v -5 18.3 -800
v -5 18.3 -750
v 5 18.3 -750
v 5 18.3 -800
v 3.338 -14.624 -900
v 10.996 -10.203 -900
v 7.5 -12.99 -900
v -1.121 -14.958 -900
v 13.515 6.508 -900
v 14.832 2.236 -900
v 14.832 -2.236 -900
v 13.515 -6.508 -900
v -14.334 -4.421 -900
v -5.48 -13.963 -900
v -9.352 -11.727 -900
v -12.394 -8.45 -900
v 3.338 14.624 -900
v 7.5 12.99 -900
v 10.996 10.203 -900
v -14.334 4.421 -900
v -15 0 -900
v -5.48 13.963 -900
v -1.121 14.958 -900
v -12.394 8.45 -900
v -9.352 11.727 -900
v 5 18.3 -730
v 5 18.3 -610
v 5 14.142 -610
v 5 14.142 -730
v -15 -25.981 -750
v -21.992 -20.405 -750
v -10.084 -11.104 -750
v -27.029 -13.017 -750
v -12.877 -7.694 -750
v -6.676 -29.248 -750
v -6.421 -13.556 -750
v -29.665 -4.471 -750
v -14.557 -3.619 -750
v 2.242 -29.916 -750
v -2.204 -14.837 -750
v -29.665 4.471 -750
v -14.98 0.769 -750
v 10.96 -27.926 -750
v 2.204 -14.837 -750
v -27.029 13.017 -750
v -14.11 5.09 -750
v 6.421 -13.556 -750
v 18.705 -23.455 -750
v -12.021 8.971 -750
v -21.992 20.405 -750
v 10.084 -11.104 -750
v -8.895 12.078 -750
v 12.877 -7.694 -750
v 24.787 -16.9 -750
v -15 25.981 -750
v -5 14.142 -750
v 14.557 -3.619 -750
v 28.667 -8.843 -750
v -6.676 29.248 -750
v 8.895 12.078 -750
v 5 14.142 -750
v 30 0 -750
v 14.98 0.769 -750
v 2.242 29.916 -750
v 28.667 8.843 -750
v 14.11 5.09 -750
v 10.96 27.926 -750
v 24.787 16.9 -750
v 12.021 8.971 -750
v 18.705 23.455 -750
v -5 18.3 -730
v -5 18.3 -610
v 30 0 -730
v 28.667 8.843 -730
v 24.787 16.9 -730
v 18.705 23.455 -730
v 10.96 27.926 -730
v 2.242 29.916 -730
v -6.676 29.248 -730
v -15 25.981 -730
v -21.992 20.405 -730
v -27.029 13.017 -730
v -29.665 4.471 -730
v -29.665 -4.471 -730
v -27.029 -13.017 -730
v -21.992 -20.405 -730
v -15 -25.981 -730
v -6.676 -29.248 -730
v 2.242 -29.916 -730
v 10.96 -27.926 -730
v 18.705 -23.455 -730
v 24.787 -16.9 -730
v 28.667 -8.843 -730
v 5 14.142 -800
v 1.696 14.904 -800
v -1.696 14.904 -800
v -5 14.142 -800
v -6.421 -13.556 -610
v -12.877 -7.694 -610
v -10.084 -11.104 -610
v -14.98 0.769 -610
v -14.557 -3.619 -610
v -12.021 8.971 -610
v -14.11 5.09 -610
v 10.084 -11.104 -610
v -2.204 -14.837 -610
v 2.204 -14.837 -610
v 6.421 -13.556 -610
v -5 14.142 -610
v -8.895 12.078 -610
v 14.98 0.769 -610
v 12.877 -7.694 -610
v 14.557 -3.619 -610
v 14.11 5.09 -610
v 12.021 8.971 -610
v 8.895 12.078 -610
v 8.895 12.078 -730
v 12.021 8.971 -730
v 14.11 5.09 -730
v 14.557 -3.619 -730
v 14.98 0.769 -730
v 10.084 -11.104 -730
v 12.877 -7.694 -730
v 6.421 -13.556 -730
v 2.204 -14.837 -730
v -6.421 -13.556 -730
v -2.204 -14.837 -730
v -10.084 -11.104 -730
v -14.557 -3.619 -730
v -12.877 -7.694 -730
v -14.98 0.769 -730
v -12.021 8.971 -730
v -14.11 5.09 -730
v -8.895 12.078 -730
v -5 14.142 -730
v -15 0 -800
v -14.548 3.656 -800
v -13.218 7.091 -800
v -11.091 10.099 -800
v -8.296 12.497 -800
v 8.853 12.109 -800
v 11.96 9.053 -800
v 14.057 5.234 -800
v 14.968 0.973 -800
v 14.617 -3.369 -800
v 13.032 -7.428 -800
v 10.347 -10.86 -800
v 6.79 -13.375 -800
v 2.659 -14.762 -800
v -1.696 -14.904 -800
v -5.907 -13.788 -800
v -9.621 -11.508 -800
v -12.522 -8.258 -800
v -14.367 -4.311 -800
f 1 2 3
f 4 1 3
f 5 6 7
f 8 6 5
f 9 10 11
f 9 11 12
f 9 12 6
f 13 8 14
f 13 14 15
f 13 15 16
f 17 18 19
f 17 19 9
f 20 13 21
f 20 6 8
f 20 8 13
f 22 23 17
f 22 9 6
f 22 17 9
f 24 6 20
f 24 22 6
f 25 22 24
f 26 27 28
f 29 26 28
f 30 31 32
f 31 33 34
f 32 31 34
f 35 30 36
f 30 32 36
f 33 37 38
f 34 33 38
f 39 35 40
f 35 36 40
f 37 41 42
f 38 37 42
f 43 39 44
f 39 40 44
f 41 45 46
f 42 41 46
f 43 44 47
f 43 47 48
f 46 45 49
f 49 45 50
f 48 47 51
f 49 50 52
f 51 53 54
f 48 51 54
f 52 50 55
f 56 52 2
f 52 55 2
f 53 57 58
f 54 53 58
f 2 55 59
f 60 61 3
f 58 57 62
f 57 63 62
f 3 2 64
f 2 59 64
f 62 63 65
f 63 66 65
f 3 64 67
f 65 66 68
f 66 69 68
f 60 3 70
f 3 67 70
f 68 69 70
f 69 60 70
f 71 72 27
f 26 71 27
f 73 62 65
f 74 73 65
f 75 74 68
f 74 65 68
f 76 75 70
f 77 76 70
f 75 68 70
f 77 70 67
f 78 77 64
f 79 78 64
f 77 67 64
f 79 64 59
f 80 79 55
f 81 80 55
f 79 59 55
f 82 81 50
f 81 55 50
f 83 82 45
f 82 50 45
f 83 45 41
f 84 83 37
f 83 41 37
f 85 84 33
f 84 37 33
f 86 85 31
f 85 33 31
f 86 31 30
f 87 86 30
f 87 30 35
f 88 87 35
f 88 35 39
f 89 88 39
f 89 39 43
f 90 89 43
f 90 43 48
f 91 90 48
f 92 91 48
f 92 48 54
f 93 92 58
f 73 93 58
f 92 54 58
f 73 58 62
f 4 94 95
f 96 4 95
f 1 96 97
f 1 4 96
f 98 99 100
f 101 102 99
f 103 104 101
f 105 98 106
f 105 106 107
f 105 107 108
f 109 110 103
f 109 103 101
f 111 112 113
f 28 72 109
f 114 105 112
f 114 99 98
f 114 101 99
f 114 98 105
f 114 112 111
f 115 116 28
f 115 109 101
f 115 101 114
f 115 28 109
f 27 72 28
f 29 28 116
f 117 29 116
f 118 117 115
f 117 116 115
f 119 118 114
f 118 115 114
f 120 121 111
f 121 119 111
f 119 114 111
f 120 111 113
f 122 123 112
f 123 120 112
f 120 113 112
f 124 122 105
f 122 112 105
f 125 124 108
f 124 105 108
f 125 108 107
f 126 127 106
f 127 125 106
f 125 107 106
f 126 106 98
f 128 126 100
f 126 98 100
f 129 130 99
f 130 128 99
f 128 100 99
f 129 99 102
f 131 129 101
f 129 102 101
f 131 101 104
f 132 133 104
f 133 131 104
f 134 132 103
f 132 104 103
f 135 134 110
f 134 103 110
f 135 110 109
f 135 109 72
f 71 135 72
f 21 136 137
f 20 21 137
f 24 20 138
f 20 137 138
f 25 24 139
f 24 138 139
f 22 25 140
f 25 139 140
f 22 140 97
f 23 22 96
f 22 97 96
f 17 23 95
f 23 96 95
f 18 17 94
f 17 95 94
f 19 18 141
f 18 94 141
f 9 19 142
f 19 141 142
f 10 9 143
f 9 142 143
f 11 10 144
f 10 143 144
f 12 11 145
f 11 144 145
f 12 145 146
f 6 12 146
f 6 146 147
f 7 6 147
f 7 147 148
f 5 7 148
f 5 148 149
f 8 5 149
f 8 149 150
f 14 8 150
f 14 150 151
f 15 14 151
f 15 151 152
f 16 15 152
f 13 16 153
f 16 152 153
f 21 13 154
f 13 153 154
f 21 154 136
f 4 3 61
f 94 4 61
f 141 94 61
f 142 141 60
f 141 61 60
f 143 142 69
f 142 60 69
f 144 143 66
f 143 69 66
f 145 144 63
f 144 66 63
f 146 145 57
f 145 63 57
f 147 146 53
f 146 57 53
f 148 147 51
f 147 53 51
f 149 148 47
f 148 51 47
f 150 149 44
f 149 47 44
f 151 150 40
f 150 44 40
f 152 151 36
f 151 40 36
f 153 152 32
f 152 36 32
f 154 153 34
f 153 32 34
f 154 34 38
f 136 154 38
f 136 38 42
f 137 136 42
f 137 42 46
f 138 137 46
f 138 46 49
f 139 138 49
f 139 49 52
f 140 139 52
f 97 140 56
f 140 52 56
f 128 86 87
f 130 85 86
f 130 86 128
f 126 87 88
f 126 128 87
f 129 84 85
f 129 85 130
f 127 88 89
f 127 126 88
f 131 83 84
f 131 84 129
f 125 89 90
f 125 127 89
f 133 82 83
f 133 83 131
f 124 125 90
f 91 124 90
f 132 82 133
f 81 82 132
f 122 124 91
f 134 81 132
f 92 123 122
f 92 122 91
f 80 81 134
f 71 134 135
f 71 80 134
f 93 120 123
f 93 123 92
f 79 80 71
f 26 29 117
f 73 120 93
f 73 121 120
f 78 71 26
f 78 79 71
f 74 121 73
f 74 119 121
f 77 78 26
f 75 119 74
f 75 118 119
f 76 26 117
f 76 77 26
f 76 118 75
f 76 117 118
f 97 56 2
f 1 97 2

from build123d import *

# Parameters (mm, degrees)
BOSS_EXTRUDE1_DEPTH = 800
SKETCH3_R           = 30
BOSS_EXTRUDE3_DEPTH = 20
SKETCH4_R           = 30
CUT_EXTRUDE1_DEPTH  = 1391.647331281
SKETCH5_R           = 15
BOSS_EXTRUDE4_DEPTH = 100
SKETCH6_R           = 30
CUT_EXTRUDE2_DEPTH  = 20
BOSS_EXTRUDE5_START = -140
SKETCH7_R           = 30
BOSS_EXTRUDE5_DEPTH = 20


with BuildPart() as part:
    # Sketch1 → Boss-Extrude1 (new, symmetric)
    with BuildSketch(Plane.XY):
        with BuildLine():
            Line((-5, 14.142135624), (-5, 18.3))
            Line((-5, 18.3), (5, 18.3))
            Line((5, 18.3), (5, 14.142135624))
            ThreePointArc((5, 14.142135624), (0, -15), (-5, 14.142135624))
        make_face()
    extrude(amount=BOSS_EXTRUDE1_DEPTH, both=True)

    # Sketch3 → Boss-Extrude3 (add)
    with BuildSketch(Plane(origin=(0, 0, 590), x_dir=(-1, 0, 0), z_dir=(0, 0, -1))):
        Circle(SKETCH3_R)
    boss_extrude3 = extrude(amount=-BOSS_EXTRUDE3_DEPTH)

    # Mirror2: Boss-Extrude3 across plane
    add(boss_extrude3.mirror(Plane.XY))

    # Sketch4 → Cut-Extrude1 (cut, through all)
    with BuildSketch(Plane.XY.offset(-590)):
        with Locations(Location((0, 0, 0), (0, 0, 180))):
            Circle(SKETCH4_R)
    extrude(amount=CUT_EXTRUDE1_DEPTH, mode=Mode.SUBTRACT)

    # Sketch5 → Boss-Extrude4 (add)
    with BuildSketch(Plane(origin=(0, 0, -800), x_dir=(-1, 0, 0), z_dir=(0, 0, -1))):
        Circle(SKETCH5_R)
    extrude(amount=BOSS_EXTRUDE4_DEPTH)

    # Sketch6 → Cut-Extrude2 (cut)
    with BuildSketch(Plane.XY.offset(-590)):
        Circle(SKETCH6_R)
    extrude(amount=-CUT_EXTRUDE2_DEPTH, mode=Mode.SUBTRACT)

    # Sketch7 → Boss-Extrude5 (add)
    with BuildSketch(Plane.XY.offset(-610).offset(BOSS_EXTRUDE5_START)):
        Circle(SKETCH7_R)
    extrude(amount=BOSS_EXTRUDE5_DEPTH)


solid = part.part
